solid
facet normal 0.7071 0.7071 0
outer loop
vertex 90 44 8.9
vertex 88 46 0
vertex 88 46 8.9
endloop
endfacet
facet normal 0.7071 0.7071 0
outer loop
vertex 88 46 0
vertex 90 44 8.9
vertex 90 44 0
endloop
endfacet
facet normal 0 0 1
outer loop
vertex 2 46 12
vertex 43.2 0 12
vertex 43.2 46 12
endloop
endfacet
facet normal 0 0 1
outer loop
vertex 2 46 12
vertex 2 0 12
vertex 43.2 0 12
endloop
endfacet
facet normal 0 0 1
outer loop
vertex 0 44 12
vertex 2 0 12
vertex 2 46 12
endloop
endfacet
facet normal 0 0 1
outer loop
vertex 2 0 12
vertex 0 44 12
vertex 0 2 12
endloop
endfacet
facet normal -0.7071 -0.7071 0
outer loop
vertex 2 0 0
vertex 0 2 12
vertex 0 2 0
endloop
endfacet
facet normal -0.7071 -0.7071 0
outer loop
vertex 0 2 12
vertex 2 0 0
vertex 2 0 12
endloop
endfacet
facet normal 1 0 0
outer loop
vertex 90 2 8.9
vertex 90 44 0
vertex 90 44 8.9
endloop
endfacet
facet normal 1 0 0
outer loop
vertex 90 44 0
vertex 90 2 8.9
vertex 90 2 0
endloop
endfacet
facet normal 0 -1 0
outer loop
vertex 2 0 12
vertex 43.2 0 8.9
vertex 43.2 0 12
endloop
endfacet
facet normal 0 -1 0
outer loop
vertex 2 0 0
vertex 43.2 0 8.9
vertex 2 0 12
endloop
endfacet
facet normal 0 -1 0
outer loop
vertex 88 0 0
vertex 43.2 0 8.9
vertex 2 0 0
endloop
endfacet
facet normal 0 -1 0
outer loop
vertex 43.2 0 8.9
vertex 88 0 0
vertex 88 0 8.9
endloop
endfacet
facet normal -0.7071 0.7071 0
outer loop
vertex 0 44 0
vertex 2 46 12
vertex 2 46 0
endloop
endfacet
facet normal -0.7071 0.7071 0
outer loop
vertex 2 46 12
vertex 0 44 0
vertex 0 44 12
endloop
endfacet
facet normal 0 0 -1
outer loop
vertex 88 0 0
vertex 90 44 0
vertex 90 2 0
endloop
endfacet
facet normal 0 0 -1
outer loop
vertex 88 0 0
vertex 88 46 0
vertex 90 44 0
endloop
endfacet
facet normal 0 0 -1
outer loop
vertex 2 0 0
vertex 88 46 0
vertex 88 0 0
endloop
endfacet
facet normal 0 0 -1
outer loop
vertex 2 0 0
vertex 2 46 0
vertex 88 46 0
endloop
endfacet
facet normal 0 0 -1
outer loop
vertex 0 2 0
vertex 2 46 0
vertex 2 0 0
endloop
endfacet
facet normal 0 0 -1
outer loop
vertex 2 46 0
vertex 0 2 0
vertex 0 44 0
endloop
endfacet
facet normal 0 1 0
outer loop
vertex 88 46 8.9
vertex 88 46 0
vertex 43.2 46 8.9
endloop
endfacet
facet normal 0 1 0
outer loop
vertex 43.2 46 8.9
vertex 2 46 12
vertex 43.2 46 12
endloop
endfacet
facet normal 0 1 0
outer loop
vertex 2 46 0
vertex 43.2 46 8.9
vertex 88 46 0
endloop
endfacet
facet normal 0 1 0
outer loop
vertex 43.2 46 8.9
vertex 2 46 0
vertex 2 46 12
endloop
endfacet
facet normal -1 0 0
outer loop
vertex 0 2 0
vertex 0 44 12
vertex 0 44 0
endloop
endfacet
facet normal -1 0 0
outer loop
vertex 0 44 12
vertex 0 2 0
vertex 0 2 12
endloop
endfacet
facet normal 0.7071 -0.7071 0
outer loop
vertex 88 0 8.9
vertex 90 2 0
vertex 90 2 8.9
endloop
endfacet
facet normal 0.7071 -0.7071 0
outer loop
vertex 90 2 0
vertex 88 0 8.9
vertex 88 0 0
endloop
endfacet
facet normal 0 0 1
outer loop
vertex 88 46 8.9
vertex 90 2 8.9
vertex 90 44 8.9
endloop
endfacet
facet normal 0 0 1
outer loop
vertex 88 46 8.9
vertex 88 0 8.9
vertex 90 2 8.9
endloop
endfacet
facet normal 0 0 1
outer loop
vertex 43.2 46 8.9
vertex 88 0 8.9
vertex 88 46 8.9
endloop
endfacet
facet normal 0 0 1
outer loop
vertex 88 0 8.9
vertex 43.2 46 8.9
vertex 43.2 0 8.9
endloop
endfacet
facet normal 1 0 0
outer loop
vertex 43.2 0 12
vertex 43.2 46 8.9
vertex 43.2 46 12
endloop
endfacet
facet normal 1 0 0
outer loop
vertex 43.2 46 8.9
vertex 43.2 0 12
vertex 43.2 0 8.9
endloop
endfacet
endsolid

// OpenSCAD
$fn = 32;

// ----------------------------------------------------------------------
// Stepped bar: endstep, 90 x 46 x 12/8.9 mm
// ----------------------------------------------------------------------

// --- parameters (mm) ---
bar_l = 90;               // bar length, X
bar_w = 46;               // bar width, Y
plate_t = 12;             // thickness of the thick zone, Z
thin_t = 8.9;             // thickness of the thin zone
corner_c = 2;             // corner chamfer of the bar
step_cut = 3.1;           // material removed from the thin zone
step_x = 43.2;            // step position from the left end
depth_1 = 3.1;            // depth of cut 1 from the top face
fit_tol = 0.1;            // declared fit tolerance (prompt contract)
free_tol = 0.5;           // declared free tolerance (prompt contract)

profile = [[2, 0], [88, 0], [90, 2], [90, 44], [88, 46], [2, 46], [0, 44], [0, 2]];  // primary outline, 8 points, counter clockwise
void_1 = [[43.2, -1], [91, -1], [91, 47], [43.2, 47]];  // thin zone beyond the step, 4 points

// --- the one profile operation ---
difference() {
  linear_extrude(height = plate_t) polygon(points = profile);
  translate([0, 0, plate_t - depth_1])
    linear_extrude(height = depth_1 + 1) polygon(points = void_1);
}
